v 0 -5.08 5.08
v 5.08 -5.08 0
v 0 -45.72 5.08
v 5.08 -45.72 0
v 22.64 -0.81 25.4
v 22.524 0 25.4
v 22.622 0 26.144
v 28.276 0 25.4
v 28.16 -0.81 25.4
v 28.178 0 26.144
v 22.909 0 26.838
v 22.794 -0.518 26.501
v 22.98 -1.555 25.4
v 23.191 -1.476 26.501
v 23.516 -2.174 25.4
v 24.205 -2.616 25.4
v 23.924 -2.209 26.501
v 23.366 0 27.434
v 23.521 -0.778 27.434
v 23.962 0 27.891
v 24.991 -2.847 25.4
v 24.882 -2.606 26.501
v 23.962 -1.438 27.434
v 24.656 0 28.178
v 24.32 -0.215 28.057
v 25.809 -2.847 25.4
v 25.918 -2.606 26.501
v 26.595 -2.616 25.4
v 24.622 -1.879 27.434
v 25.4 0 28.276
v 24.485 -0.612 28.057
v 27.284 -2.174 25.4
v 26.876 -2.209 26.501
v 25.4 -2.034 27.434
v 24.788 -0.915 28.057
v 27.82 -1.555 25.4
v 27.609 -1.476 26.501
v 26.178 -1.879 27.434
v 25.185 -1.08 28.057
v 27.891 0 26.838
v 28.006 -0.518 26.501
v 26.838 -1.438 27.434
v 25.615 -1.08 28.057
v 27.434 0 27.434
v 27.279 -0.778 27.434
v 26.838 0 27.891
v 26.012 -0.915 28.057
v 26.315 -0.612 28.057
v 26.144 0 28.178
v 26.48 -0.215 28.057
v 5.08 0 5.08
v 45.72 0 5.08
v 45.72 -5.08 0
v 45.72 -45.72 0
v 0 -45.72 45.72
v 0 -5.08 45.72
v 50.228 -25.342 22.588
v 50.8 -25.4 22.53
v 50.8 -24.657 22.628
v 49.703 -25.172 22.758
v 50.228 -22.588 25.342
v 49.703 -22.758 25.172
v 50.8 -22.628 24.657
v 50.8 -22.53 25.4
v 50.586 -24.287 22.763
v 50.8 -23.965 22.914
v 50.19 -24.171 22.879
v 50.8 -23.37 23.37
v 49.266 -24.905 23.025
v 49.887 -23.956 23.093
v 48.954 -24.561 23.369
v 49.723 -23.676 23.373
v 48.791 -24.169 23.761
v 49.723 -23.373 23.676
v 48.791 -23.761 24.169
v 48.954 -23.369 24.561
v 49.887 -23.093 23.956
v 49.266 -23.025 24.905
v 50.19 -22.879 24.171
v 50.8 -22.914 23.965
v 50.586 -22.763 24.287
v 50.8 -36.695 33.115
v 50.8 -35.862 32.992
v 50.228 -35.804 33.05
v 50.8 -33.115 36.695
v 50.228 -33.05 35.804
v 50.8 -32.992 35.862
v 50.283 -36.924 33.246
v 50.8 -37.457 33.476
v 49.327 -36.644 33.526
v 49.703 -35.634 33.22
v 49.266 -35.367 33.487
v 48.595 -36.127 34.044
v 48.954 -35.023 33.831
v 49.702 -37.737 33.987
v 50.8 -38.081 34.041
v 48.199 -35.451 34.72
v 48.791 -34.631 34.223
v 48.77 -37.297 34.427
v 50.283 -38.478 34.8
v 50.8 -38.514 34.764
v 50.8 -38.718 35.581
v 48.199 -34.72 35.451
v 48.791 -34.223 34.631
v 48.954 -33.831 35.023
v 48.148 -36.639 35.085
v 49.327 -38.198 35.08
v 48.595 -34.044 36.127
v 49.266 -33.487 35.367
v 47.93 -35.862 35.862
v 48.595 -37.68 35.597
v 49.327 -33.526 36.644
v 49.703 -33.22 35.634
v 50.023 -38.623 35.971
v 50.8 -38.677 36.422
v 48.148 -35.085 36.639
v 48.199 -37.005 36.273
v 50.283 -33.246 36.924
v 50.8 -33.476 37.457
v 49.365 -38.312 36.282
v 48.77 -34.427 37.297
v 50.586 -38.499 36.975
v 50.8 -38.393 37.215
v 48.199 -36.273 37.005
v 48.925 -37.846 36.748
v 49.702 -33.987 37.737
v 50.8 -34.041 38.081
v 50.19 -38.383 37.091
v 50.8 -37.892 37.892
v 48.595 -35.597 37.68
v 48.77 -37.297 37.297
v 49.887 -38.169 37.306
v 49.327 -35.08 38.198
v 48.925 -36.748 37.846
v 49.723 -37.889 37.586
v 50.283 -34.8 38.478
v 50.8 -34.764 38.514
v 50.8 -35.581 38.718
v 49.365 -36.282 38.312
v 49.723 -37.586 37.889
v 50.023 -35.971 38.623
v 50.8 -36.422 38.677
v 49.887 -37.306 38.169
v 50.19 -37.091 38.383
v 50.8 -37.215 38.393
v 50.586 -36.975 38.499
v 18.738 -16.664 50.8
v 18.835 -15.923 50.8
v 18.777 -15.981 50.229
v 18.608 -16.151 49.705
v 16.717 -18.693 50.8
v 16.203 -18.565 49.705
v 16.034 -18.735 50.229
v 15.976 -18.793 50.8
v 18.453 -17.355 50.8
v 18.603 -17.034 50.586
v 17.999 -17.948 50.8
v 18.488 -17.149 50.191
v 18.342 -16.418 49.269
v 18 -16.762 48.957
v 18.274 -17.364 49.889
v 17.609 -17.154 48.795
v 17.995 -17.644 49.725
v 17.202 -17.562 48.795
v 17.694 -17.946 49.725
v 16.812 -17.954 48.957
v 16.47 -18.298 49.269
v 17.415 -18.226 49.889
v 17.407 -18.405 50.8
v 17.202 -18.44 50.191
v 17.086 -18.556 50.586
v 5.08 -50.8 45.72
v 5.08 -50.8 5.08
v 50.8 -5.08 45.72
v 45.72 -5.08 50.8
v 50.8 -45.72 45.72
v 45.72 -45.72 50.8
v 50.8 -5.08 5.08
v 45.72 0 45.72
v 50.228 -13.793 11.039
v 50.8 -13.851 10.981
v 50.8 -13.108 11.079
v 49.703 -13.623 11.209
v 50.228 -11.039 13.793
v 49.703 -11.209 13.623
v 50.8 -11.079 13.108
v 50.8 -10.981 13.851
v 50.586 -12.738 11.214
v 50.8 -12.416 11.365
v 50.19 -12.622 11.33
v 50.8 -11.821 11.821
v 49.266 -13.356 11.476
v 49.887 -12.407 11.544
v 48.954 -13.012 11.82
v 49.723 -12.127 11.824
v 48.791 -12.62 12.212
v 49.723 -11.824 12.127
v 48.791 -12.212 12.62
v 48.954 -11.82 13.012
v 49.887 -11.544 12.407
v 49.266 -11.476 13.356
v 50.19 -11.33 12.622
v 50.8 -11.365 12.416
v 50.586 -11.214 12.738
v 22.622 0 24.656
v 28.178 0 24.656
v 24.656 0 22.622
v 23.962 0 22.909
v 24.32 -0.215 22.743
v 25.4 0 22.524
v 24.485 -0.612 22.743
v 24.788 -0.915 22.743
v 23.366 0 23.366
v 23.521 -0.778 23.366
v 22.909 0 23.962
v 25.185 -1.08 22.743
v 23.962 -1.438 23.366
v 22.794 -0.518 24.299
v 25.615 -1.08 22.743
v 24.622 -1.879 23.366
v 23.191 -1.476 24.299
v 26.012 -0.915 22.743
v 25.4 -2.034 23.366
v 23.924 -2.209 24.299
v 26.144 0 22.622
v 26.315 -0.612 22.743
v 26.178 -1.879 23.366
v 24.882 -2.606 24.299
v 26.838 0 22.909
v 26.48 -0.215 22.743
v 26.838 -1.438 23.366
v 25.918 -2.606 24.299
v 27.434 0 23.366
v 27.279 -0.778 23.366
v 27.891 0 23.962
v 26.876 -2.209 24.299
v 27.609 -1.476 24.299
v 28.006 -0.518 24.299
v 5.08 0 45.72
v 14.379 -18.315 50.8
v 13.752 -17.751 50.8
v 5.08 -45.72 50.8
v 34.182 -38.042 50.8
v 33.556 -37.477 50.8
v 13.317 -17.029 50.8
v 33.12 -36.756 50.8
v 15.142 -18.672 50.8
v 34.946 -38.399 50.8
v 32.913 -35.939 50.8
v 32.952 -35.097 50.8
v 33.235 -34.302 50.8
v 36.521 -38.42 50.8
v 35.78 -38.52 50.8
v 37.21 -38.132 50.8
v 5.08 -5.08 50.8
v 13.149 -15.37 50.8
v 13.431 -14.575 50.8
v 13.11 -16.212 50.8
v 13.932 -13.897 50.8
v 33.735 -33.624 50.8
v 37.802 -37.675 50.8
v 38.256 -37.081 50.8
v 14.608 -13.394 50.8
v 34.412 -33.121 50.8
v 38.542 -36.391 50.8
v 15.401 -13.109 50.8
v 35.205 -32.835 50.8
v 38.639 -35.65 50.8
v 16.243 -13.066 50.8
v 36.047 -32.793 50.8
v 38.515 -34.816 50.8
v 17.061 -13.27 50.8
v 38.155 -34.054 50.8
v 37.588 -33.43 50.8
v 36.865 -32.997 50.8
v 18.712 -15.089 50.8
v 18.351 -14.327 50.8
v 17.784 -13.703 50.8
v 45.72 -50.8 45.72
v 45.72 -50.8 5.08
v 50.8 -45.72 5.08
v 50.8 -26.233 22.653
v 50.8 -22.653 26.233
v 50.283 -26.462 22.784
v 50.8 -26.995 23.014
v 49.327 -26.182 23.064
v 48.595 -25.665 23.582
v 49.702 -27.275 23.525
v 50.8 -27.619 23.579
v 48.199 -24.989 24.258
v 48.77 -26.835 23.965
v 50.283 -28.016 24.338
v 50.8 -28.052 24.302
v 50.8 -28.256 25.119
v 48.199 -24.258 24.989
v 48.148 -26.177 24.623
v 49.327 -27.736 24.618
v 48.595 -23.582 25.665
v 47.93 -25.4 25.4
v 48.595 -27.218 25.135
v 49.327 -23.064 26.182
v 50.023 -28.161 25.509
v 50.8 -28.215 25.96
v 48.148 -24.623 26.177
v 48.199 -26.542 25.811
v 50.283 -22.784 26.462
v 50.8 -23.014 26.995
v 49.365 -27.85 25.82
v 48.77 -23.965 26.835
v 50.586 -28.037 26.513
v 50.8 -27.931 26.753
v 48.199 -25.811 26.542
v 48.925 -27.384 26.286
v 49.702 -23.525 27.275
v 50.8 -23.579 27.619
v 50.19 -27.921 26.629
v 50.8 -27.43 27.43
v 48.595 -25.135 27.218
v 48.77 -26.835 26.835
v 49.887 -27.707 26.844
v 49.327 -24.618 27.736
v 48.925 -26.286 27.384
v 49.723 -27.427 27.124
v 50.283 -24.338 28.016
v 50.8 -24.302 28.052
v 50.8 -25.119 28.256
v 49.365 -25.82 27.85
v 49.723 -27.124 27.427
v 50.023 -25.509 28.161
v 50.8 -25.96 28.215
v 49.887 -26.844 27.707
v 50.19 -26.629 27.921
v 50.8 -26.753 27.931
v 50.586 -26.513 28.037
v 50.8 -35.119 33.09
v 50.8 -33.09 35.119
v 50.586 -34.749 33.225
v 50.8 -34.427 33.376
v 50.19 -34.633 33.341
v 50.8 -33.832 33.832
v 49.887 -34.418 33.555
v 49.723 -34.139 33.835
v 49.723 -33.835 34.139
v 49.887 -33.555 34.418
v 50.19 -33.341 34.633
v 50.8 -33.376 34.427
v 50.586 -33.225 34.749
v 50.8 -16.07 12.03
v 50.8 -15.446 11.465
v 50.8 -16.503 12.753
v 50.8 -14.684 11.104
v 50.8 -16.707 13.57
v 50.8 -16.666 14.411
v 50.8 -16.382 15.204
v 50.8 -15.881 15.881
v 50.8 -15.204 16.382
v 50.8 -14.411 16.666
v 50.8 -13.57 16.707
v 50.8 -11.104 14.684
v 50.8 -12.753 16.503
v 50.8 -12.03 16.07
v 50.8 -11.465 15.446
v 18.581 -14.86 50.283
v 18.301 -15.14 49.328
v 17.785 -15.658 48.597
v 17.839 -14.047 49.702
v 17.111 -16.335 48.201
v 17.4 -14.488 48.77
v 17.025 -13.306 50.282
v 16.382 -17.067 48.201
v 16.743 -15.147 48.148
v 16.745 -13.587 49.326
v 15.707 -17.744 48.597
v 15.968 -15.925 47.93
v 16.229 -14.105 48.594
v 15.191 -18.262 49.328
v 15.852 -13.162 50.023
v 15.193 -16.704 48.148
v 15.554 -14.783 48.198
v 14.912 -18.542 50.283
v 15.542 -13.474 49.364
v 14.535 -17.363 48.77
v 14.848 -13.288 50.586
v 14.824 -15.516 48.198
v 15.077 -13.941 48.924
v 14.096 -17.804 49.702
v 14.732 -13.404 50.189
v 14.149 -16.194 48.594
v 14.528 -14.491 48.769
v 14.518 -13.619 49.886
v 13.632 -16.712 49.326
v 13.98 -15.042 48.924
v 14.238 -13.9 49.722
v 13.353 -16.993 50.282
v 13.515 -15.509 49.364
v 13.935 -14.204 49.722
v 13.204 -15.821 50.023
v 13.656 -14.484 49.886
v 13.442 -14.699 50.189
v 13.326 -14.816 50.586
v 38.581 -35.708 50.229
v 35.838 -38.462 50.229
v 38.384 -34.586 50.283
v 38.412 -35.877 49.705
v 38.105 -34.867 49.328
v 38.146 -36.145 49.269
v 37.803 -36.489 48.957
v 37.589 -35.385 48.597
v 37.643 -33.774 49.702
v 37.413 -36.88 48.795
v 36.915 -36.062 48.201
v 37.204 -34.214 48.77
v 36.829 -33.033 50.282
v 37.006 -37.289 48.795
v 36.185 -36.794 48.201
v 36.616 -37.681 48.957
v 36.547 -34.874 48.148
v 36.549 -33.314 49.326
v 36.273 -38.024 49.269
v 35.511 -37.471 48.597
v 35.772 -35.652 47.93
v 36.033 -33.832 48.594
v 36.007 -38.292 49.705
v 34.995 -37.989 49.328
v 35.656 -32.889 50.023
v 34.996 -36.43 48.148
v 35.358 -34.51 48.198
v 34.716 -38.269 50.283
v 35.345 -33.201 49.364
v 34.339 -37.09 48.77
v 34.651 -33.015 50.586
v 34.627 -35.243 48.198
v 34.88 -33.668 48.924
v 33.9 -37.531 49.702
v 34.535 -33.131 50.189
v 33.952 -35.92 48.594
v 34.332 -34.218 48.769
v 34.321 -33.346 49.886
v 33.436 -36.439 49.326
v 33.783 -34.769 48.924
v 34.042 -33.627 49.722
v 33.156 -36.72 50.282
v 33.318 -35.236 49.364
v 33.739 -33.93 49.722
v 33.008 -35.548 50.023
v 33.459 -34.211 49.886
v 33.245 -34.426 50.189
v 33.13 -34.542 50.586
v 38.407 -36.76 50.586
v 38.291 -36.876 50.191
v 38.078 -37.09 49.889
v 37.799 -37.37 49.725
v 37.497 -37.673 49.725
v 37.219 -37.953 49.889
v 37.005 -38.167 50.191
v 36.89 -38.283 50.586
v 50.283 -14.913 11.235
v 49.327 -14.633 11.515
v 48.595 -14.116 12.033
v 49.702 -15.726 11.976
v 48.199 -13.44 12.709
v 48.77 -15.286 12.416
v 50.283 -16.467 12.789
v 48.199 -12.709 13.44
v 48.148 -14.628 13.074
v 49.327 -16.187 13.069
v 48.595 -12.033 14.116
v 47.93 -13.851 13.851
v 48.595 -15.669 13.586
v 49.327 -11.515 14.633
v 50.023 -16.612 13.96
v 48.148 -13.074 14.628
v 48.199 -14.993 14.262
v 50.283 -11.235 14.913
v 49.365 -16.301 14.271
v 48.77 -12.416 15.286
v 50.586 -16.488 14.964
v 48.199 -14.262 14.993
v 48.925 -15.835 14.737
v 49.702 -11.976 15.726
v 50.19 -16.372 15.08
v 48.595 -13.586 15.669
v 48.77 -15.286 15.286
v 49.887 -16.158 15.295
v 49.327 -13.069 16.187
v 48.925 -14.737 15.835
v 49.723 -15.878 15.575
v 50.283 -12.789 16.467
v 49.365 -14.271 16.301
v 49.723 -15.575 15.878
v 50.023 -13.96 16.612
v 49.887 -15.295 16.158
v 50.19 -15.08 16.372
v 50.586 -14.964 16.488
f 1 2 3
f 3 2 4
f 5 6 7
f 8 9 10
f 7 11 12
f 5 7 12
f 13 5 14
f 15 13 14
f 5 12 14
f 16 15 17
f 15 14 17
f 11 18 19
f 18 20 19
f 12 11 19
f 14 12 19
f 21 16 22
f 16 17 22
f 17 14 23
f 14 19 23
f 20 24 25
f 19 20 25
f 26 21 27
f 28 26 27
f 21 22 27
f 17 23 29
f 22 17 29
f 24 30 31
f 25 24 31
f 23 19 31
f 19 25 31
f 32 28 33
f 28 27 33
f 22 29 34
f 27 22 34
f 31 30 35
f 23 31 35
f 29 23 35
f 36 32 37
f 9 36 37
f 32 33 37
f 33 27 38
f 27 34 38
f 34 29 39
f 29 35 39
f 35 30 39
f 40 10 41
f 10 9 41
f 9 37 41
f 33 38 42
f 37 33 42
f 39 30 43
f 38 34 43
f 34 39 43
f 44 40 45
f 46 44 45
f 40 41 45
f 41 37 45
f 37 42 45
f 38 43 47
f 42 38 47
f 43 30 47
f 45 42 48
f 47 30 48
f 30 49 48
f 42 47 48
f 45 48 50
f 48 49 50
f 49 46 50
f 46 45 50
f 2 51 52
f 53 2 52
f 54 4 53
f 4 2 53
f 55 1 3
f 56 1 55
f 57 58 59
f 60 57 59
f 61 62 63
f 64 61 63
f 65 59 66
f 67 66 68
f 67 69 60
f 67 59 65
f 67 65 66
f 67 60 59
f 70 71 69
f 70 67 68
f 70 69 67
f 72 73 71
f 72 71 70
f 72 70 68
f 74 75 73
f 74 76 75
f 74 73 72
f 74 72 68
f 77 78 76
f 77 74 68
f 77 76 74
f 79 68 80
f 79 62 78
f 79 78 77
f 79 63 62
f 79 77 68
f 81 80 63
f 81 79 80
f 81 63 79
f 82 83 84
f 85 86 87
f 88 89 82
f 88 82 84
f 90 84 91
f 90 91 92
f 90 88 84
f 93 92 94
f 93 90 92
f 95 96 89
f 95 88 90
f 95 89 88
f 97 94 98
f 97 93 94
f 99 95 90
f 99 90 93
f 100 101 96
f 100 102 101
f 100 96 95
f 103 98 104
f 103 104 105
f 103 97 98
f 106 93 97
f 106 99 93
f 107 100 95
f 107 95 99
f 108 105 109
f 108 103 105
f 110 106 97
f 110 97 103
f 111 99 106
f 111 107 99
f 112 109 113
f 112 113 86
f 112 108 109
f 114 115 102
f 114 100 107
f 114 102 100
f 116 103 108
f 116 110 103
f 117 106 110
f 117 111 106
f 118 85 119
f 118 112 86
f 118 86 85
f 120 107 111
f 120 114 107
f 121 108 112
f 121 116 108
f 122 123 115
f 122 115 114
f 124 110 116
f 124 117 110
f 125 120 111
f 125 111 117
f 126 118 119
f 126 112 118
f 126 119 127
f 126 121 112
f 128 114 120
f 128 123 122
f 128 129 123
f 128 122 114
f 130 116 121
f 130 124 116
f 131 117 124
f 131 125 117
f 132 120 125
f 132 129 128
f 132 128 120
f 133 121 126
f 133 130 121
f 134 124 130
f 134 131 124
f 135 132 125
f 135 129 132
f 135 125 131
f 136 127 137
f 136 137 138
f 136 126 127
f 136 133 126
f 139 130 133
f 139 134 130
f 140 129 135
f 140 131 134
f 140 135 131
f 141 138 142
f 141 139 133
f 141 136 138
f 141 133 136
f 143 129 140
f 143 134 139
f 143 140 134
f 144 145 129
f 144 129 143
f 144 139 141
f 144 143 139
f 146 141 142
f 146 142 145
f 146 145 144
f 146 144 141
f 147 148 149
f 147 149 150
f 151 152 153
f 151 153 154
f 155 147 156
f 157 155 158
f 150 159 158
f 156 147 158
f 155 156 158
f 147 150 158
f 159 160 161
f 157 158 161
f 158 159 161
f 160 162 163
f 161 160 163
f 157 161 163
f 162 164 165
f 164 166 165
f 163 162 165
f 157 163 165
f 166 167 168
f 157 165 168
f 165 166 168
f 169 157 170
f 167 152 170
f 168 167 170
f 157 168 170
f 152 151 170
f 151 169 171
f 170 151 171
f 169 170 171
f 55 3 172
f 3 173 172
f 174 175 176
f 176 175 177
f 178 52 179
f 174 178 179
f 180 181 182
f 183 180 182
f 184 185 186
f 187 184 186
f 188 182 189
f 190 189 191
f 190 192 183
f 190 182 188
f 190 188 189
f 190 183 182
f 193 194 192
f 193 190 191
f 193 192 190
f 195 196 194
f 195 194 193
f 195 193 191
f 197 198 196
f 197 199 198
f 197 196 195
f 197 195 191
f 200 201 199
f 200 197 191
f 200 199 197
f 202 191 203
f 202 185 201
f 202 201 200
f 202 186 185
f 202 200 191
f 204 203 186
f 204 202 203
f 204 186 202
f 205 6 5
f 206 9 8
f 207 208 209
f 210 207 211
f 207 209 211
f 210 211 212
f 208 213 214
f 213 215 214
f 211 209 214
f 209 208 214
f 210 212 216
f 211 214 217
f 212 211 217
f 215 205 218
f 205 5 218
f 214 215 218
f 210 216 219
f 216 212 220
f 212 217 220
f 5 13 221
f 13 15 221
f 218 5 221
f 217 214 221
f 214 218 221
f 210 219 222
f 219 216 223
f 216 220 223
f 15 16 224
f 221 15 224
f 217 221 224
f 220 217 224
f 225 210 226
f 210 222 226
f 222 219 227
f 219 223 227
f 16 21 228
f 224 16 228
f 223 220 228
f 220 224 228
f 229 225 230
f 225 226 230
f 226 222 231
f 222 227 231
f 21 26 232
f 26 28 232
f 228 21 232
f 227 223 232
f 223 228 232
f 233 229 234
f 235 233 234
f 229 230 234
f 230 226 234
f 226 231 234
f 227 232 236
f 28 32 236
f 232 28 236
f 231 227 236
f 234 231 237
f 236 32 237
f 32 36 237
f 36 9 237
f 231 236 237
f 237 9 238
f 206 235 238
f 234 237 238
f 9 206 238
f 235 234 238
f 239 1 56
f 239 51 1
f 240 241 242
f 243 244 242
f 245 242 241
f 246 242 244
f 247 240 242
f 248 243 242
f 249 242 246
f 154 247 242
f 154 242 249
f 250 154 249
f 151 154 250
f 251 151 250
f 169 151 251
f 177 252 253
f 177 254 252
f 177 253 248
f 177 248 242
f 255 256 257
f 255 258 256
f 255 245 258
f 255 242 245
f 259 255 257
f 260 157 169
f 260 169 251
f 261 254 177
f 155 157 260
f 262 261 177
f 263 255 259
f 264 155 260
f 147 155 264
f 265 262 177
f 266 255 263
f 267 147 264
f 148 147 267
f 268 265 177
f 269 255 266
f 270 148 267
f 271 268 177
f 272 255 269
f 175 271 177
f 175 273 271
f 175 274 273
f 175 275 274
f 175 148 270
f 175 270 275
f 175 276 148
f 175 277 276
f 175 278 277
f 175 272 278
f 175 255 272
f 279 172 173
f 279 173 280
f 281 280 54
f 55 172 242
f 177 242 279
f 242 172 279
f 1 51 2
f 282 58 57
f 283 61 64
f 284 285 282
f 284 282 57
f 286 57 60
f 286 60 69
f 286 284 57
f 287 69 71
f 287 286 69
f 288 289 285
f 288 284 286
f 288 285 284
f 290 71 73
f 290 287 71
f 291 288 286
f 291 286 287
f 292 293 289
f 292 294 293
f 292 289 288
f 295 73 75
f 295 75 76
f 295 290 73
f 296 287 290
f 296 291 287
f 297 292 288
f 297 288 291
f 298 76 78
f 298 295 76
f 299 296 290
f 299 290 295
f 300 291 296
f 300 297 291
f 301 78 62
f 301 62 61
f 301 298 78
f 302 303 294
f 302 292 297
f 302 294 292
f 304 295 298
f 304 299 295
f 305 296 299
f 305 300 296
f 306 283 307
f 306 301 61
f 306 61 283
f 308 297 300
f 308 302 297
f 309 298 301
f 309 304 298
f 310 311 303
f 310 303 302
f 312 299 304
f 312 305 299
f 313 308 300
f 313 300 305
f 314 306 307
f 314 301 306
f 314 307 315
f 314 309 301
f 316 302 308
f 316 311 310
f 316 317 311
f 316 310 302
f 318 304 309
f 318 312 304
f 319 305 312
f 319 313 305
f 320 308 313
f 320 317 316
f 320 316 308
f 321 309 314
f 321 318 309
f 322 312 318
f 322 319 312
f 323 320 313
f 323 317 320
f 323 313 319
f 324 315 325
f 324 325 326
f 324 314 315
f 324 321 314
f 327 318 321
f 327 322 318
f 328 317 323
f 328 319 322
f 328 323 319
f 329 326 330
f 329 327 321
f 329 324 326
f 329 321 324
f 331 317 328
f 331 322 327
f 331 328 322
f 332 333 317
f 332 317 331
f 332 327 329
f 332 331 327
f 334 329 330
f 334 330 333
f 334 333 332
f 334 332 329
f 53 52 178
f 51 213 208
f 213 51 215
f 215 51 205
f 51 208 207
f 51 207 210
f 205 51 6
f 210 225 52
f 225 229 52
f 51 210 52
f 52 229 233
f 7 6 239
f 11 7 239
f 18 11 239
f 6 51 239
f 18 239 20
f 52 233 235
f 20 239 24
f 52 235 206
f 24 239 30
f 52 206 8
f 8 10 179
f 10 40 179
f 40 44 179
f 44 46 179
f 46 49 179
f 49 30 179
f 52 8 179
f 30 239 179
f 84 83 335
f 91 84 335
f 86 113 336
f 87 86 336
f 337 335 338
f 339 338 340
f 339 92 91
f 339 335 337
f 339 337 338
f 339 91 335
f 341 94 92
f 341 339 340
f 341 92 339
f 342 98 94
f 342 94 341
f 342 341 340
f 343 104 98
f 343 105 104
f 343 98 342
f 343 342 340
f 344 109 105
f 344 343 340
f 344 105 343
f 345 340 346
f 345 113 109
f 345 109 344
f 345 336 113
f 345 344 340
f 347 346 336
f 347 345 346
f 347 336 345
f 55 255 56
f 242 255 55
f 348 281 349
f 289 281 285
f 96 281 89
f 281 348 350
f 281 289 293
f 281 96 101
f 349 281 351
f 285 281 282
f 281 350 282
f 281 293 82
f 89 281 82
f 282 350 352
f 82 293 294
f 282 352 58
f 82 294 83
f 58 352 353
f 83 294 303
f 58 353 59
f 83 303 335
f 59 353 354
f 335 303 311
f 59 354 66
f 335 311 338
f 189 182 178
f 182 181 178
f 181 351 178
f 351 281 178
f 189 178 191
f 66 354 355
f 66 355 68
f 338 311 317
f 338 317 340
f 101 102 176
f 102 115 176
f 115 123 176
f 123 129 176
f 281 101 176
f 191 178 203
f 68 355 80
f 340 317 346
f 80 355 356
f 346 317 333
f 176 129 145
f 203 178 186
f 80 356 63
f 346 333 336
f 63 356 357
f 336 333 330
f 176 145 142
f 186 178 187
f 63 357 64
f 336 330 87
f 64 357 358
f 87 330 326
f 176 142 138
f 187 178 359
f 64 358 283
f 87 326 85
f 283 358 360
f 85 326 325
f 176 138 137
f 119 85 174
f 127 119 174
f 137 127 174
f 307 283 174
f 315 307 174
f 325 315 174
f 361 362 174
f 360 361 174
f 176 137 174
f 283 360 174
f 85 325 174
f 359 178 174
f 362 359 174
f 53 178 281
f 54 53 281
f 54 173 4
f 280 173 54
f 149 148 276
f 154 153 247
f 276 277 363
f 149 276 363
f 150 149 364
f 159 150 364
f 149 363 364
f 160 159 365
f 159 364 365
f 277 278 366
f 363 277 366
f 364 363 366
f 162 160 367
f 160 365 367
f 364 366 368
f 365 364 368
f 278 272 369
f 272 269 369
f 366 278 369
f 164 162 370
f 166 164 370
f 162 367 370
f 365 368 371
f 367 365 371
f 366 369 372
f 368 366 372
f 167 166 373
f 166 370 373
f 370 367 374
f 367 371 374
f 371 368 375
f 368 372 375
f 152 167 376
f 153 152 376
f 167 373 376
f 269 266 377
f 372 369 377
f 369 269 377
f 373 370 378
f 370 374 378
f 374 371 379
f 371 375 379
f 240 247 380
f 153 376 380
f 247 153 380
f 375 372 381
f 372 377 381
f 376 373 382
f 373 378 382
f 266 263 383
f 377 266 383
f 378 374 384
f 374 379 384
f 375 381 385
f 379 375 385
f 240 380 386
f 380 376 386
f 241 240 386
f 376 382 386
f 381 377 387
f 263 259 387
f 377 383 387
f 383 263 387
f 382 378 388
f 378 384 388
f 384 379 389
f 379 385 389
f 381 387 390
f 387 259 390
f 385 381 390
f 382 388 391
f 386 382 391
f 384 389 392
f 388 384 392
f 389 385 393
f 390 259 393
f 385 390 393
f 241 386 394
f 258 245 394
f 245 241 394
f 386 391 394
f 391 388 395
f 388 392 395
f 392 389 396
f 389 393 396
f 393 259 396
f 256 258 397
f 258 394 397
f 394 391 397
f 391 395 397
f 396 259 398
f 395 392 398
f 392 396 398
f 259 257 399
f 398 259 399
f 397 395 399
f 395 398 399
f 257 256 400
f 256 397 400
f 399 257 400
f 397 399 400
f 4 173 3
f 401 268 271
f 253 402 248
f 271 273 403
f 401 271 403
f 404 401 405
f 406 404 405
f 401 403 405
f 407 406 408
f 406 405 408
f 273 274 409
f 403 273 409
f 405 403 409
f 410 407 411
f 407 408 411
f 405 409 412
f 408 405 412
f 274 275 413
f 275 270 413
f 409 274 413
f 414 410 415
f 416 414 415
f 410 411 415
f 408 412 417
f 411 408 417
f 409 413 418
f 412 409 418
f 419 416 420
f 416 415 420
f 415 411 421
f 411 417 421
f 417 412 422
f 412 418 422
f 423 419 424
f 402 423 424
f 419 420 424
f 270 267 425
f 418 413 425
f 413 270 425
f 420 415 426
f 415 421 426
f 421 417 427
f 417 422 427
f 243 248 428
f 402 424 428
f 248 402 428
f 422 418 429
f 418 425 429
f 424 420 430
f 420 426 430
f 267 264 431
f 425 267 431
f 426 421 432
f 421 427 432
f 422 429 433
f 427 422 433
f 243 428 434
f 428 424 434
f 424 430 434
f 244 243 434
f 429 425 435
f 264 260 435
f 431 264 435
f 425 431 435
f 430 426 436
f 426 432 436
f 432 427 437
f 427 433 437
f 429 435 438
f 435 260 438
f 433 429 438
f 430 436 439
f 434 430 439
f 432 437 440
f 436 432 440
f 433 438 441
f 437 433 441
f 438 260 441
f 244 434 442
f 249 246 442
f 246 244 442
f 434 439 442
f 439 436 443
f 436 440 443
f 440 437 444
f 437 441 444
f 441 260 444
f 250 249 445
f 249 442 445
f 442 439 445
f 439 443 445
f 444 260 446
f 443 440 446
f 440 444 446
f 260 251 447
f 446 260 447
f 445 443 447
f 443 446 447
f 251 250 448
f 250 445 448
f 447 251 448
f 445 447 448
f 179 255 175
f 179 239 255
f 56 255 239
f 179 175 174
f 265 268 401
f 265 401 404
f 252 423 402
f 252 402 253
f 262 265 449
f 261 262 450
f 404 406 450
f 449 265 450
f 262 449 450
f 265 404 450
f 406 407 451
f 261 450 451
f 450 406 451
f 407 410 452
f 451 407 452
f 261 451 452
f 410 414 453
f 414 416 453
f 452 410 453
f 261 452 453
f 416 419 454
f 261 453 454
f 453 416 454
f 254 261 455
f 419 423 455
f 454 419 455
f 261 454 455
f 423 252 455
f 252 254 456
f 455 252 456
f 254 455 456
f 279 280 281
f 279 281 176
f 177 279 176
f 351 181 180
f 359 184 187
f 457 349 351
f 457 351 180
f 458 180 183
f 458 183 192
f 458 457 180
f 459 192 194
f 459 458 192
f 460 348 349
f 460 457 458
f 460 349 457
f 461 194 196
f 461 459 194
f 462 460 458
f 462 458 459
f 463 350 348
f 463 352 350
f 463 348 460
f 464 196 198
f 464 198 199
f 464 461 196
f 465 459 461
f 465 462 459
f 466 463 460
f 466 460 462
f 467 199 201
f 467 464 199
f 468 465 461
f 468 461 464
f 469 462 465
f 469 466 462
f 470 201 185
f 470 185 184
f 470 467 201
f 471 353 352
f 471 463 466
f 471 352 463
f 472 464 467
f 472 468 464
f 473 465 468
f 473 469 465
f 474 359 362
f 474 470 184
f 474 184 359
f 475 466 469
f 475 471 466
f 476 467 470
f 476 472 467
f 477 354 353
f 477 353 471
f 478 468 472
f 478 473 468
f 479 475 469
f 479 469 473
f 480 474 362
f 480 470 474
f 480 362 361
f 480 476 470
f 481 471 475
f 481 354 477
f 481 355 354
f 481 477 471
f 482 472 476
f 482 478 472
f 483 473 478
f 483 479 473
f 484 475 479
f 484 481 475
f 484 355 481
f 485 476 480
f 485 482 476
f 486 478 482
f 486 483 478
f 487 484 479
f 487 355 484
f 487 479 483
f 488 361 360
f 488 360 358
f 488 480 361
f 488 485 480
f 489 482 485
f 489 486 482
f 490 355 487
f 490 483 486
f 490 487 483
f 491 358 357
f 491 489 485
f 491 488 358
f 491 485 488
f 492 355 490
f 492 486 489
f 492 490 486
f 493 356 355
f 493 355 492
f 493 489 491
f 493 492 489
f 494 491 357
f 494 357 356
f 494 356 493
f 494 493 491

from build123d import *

# Parameters (mm, degrees)
F0_W     = 50.7999993861
F0_H     = 50.8000031114
F1_DEPTH = 50.8
F2_SIZE  = 5.08


with BuildPart() as f1:
    # F0 (on Front) → F1 (new body)
    with BuildSketch(Plane.XZ):
        with Locations((25.399999693, 25.4000015557)):
            Rectangle(F0_W, F0_H)
    extrude(amount=F1_DEPTH)

    # F2
    f2_edges = [f1.edges().sort_by_distance(p)[0] for p in [
        (25.4, -50.8, 50.800003),
        (0, -50.8, 25.400002),
        (25.4, -50.8, 0),
        (50.799999, -50.8, 25.400002),
        (50.799999, -25.4, 50.800003),
        (25.4, 0, 50.800003),
        (0, -25.4, 50.800003),
        (0, 0, 25.400002),
        (25.4, 0, 0),
        (50.799999, 0, 25.400002),
        (0, -25.4, 0),
        (50.799999, -25.4, 0),
    ]]
    chamfer(f2_edges, length=F2_SIZE)

    # F3 (on face) → F4 (revolve, cut)
    with BuildSketch(Plane(origin=(0, 0, 0), x_dir=(-1, 0, 0), z_dir=(0, 1, 0))):
        with BuildLine():
            Line((-25.399999693, 28.2762738749), (-25.399999693, 22.5237292365))
            ThreePointArc((-25.399999693, 22.5237292365), (-23.3661680316, 23.3661698942), (-22.5237273738, 25.4000015557))
            ThreePointArc((-22.5237273738, 25.4000015557), (-23.3661680316, 27.4338332171), (-25.399999693, 28.2762738749))
        make_face()
    revolve(axis=Axis((25.399999693, 0, 25.4000015557), (0, 0, 1)), mode=Mode.SUBTRACT)

    # F5 (on face) → F6 (revolve, cut)
    with BuildSketch(Plane.XY.offset(50.8000031114)):
        with BuildLine():
            Line((33.7353862623, -33.6240240537), (37.8023569838, -37.6751894799))
            ThreePointArc((37.8023569838, -37.6751894799), (38.4216586219, -36.745402906), (38.639071623, -35.6496067668))
            ThreePointArc((38.639071623, -35.6496067668), (36.8646677623, -32.9968197679), (33.7353862623, -33.6240240537))
        make_face()
        with BuildLine():
            ThreePointArc((18.8353189816, -15.9228166067), (17.0609151208, -13.2700296079), (13.9316336208, -13.8972338936))
            Line((13.9316336208, -13.8972338936), (17.9986043423, -17.9483993198))
            ThreePointArc((17.9986043423, -17.9483993198), (18.6179059804, -17.018612746), (18.8353189816, -15.9228166067))
        make_face()
    revolve(axis=Axis((25.2446672624, -25.1663021739, 50.8000031114), (-0.708482113, 0.7057287691, 0)), mode=Mode.SUBTRACT)

    # F7 (on face) → F8 (revolve, cut)
    with BuildSketch(Plane.YZ.offset(50.7999993861)):
        with BuildLine():
            ThreePointArc((-32.9918336927, 35.8620360494), (-34.7636556544, 38.5137550626), (-37.8915714984, 37.8915740104))
            Line((-37.8915714984, 37.8915740104), (-33.832495887, 33.8324980883))
            ThreePointArc((-33.832495887, 33.8324980883), (-33.2103146795, 34.763658011), (-32.9918336927, 35.8620360494))
        make_face()
        with BuildLine():
            ThreePointArc((-22.5298, 25.4000015557), (-24.3016219617, 28.0517205689), (-27.4295378057, 27.4295395167))
            Line((-27.4295378057, 27.4295395167), (-23.3704621943, 23.3704635946))
            ThreePointArc((-23.3704621943, 23.3704635946), (-22.7482809868, 24.3016235174), (-22.5298, 25.4000015557))
        make_face()
        with BuildLine():
            Line((-15.8805371302, 15.8805379571), (-11.8214615189, 11.821462035))
            ThreePointArc((-11.8214615189, 11.821462035), (-11.1992803114, 12.7526219577), (-10.9807993246, 13.8509999961))
            ThreePointArc((-10.9807993246, 13.8509999961), (-12.7526212862, 16.5027190093), (-15.8805371302, 15.8805379571))
        make_face()
    revolve(axis=Axis((50.7999993861, -25.4, 25.4000015557), (0, 0.7071067541, -0.7071068083)), mode=Mode.SUBTRACT)


solid = f1.part
